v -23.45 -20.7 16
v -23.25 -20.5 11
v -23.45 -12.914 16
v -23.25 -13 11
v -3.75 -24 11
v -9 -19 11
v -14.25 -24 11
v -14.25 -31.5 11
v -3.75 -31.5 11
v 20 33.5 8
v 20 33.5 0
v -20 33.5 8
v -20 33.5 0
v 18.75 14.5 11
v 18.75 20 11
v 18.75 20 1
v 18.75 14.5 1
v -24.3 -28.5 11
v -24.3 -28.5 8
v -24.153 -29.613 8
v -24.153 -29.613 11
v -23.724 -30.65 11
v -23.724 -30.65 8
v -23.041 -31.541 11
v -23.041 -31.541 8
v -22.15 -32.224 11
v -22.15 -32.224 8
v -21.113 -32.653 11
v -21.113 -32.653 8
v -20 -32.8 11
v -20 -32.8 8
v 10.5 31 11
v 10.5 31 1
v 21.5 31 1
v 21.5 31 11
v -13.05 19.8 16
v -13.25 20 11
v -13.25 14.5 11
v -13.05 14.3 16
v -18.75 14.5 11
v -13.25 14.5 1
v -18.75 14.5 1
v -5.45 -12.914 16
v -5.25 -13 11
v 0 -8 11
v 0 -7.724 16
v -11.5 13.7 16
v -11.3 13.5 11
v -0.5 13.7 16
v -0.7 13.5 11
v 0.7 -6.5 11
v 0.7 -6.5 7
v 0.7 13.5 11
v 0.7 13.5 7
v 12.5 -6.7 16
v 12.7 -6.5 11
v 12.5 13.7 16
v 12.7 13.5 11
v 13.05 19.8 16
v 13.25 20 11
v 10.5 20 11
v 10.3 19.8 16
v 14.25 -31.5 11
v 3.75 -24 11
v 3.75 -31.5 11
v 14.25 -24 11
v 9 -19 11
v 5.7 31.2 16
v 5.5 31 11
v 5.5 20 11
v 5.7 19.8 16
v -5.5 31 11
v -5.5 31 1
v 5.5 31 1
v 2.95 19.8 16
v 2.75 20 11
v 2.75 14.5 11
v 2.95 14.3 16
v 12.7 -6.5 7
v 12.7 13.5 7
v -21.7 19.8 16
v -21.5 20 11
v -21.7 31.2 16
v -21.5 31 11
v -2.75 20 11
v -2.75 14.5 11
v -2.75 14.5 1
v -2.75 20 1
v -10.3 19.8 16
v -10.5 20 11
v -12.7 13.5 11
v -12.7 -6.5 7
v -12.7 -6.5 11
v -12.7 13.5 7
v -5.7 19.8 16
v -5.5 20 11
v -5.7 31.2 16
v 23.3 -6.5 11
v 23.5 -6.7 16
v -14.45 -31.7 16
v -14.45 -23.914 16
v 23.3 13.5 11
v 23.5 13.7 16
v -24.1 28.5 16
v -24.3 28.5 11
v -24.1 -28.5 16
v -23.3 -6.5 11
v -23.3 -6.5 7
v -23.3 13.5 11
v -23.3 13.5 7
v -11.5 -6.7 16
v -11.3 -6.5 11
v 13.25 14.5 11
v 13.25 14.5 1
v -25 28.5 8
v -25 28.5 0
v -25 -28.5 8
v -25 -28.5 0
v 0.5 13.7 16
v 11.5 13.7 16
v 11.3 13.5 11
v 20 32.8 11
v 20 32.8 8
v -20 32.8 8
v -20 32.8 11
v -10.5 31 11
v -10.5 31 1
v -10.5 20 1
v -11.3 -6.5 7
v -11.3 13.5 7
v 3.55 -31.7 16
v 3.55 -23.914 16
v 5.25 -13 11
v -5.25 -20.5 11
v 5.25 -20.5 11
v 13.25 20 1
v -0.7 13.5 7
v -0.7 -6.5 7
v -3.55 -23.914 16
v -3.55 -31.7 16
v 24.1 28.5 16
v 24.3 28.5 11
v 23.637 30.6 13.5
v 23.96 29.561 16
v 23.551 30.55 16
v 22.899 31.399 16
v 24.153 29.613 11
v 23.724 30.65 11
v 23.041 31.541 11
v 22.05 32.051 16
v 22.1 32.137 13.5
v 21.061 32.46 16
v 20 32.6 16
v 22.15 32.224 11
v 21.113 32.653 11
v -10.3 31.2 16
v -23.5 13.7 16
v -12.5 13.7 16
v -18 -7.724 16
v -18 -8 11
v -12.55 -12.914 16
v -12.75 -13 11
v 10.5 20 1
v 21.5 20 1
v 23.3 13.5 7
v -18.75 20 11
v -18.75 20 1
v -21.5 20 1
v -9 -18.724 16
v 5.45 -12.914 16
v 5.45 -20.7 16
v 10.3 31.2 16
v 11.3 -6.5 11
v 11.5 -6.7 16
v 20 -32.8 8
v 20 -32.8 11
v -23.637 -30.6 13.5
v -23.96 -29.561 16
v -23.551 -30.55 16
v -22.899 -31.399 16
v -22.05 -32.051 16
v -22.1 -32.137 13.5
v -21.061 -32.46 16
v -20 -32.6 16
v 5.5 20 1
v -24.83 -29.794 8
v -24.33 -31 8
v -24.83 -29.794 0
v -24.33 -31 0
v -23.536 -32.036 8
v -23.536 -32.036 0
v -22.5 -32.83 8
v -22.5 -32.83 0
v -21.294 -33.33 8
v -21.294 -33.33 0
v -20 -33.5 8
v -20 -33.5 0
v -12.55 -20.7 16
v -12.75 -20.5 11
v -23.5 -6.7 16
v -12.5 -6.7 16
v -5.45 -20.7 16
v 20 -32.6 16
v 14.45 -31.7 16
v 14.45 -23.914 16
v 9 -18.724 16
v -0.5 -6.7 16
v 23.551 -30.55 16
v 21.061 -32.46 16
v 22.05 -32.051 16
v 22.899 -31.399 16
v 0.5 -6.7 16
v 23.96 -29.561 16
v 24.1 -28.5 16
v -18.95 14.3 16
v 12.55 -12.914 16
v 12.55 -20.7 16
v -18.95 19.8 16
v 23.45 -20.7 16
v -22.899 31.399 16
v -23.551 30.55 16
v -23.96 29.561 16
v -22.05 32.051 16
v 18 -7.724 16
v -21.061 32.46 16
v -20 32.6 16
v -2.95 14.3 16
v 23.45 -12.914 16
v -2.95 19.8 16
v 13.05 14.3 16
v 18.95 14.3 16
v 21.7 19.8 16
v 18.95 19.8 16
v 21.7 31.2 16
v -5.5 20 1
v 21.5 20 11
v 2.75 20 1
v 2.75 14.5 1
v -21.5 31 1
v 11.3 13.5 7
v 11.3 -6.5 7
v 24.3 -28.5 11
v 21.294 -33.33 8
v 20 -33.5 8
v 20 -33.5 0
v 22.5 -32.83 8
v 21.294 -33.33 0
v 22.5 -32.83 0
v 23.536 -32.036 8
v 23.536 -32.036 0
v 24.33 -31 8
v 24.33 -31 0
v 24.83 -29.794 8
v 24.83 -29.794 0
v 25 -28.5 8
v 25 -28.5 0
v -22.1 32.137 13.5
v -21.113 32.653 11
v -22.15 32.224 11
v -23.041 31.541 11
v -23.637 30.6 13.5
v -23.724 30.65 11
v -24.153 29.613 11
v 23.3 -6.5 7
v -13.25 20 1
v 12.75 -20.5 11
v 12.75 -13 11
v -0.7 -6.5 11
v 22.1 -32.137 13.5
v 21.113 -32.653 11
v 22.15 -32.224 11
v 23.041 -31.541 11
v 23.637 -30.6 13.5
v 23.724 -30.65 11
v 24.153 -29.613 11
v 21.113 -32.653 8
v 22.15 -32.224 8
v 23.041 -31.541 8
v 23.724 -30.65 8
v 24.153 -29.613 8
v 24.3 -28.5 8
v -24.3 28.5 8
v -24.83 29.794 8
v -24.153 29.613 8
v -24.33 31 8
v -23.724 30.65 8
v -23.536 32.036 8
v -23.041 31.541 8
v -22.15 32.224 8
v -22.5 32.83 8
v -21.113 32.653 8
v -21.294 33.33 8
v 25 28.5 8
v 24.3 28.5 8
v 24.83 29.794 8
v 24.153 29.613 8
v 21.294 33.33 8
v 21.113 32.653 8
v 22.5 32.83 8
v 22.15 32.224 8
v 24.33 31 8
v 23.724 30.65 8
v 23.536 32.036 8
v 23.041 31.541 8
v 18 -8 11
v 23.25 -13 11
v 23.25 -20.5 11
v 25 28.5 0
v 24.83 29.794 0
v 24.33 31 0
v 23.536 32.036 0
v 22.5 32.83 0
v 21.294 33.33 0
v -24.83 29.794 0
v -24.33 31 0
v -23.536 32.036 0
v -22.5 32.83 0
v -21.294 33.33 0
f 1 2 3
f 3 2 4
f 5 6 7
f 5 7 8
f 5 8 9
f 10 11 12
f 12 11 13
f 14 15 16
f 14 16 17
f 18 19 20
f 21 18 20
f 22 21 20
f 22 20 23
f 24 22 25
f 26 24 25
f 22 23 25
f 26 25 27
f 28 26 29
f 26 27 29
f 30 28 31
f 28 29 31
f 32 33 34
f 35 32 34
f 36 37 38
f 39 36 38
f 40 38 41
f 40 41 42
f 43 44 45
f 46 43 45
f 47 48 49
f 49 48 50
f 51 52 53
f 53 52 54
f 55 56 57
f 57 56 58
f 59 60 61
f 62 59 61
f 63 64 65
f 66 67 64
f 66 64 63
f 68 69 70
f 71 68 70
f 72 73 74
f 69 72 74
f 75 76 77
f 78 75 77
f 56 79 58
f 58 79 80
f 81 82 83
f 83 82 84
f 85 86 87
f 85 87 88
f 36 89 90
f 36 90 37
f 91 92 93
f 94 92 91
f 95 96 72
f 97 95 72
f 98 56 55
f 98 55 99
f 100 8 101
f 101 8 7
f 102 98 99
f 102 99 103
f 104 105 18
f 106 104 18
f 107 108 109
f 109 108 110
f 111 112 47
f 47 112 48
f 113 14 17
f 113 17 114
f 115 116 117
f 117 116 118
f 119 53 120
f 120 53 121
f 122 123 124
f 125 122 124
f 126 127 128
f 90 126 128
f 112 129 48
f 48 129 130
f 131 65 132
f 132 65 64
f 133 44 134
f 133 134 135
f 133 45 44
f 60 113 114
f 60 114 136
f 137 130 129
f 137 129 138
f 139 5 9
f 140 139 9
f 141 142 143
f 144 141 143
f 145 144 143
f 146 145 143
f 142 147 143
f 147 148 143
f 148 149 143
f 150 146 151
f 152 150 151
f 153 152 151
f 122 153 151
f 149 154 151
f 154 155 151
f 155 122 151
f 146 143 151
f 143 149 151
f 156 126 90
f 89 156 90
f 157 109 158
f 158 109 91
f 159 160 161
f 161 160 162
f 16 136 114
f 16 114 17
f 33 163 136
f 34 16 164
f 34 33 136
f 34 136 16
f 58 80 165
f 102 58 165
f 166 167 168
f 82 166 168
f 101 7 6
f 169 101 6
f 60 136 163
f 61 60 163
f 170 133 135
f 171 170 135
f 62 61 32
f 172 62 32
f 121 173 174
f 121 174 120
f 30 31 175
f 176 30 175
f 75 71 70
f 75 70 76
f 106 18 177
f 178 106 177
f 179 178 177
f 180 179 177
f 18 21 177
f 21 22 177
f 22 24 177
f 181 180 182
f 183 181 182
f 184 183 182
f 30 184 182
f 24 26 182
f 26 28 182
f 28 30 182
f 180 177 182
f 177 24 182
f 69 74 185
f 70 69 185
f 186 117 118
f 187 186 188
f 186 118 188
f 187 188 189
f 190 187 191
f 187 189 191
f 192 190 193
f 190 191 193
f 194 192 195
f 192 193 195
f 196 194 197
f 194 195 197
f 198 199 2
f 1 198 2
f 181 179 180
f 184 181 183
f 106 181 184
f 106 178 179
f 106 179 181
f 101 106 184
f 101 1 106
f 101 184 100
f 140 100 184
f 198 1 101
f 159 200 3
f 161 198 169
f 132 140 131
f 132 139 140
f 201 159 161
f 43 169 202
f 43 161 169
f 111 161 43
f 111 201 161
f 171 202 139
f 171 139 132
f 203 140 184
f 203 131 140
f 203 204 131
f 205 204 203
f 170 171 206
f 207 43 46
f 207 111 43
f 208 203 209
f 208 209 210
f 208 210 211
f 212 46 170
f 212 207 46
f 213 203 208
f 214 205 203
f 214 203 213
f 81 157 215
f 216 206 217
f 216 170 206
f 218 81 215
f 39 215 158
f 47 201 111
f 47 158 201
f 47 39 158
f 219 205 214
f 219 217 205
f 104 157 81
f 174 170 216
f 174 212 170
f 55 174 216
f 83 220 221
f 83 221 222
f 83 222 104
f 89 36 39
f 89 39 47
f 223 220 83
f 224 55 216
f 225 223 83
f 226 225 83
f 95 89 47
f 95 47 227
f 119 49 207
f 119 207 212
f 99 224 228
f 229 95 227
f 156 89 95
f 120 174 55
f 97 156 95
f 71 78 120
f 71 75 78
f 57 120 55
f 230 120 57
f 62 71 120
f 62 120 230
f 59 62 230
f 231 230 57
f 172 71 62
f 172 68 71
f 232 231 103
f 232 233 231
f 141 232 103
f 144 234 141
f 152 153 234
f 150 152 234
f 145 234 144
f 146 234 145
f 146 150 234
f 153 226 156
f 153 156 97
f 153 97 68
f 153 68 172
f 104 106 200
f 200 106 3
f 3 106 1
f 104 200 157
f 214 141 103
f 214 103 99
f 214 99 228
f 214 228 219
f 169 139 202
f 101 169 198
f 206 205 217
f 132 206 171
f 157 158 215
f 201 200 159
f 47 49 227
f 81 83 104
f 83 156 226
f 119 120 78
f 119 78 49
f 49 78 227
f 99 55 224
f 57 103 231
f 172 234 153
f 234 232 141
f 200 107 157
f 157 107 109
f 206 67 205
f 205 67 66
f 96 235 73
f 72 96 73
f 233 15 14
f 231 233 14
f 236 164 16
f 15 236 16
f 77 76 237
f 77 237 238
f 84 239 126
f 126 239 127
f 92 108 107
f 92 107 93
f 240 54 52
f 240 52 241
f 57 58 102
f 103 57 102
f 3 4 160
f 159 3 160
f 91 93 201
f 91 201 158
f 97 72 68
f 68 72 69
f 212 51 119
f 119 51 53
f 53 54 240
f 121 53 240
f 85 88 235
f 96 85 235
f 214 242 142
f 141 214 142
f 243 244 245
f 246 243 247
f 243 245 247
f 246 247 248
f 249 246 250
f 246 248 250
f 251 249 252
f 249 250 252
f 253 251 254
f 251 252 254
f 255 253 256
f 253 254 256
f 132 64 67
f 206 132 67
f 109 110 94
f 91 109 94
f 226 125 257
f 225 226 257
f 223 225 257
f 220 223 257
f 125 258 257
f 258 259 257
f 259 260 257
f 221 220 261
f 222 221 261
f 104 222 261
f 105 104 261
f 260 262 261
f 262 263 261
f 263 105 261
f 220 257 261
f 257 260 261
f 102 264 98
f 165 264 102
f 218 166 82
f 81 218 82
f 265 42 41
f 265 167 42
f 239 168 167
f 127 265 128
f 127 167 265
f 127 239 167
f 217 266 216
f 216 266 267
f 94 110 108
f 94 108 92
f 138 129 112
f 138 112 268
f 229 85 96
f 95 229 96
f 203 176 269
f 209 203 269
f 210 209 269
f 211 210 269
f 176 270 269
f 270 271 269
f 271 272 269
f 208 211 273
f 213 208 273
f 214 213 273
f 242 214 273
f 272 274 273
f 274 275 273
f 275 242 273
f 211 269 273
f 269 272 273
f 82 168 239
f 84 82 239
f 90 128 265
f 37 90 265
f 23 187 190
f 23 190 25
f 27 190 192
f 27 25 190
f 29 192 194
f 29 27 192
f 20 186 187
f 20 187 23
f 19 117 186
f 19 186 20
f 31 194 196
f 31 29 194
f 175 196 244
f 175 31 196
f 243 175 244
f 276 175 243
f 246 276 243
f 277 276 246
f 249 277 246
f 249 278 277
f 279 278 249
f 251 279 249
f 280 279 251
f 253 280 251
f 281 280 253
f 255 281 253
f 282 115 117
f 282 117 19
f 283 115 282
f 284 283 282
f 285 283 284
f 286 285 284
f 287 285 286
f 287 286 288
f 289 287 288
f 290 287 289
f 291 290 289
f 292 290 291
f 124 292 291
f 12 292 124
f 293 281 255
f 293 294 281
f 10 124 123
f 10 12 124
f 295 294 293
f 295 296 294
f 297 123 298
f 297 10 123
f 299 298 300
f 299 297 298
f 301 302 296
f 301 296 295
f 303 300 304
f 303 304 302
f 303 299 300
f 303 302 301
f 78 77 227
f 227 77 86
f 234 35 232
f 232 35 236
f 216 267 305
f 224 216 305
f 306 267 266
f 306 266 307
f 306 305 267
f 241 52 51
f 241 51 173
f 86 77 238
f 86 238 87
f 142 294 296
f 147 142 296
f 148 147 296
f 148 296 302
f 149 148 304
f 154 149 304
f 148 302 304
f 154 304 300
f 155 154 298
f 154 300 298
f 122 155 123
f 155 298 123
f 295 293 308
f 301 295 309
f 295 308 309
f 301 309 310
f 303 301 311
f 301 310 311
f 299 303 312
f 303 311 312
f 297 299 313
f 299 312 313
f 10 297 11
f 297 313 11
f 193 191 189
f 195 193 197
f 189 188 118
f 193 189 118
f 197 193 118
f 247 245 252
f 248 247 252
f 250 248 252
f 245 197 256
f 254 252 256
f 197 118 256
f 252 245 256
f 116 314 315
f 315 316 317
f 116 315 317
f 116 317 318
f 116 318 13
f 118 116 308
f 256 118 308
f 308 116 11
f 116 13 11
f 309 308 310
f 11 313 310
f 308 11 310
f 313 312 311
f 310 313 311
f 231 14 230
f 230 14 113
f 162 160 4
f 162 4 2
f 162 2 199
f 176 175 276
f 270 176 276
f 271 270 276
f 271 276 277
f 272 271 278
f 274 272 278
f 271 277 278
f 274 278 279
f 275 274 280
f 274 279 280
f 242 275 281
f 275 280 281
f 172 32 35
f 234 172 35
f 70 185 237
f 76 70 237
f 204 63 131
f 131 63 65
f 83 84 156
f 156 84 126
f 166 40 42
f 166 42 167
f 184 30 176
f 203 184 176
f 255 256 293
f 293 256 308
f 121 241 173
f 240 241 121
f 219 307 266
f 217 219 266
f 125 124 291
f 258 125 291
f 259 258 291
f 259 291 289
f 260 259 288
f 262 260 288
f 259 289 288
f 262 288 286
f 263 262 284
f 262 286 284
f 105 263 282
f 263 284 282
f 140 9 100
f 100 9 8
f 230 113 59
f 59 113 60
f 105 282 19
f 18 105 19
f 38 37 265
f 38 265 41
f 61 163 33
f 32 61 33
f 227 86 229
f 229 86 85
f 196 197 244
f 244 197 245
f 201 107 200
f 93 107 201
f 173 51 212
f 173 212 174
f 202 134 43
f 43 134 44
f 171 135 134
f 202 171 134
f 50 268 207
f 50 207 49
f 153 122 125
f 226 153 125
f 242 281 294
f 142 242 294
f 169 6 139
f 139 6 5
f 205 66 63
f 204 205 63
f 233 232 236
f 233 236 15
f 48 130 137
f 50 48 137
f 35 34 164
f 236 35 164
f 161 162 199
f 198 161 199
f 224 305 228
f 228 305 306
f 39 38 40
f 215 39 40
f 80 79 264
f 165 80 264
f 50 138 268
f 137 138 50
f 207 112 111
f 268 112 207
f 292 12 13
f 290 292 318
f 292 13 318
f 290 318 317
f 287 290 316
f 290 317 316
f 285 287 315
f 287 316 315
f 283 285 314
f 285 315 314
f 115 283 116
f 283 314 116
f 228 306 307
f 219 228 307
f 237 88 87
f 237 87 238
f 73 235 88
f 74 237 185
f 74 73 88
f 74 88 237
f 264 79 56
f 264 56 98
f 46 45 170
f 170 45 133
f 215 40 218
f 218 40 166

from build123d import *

# Parameters (mm, degrees)
F1_DEPTH = 1
F0_W     = 10.6
F0_H     = 20
F2_DEPTH = 7
F3_DEPTH = 11
F4_DEPTH = 16
F5_DEPTH = 8
F6_SIZE2 = 4.99999
F6_SIZE  = 0.19999


# Not quite as in the source:
# - a fillet or chamfer is up to 0.001 mm smaller than in the source, because OpenCascade refuses the exact size


with BuildPart() as f1:
    # F0 (on Top) → F1 (new body)
    with BuildSketch(Plane.XY):
        Polygon((-18.75, 14.5), (-13.25, 14.5), (-13.25, 20), (-10.5, 20), (-10.5, 31), (-21.5, 31), (-21.5, 20), (-18.75, 20), align=None)
    extrude(amount=F1_DEPTH)



with BuildPart() as f1b:
    # F0 (on Top) → F1, piece 2 (new body)
    with BuildSketch(Plane.XY):
        Polygon((5.5, 31), (-5.5, 31), (-5.5, 20), (-2.75, 20), (-2.75, 14.5), (2.75, 14.5), (2.75, 20), (5.5, 20), align=None)
    extrude(amount=F1_DEPTH)


with BuildPart() as f1c:
    # F0 (on Top) → F1, piece 3 (new body)
    with BuildSketch(Plane.XY):
        Polygon((21.5, 31), (10.5, 31), (10.5, 20), (13.25, 20), (13.25, 14.5), (18.75, 14.5), (18.75, 20), (21.5, 20), align=None)
    extrude(amount=F1_DEPTH)


with BuildPart() as f2:
    # F0 (on Top) → F2 (new body)
    with BuildSketch(Plane.XY):
        with Locations((-18, 3.5)):
            Rectangle(F0_W, F0_H)
    extrude(amount=F2_DEPTH)


with BuildPart() as f2b:
    # F0 (on Top) → F2, piece 2 (new body)
    with BuildSketch(Plane.XY):
        with Locations((-6, 3.5)):
            Rectangle(F0_W, F0_H)
    extrude(amount=F2_DEPTH)


with BuildPart() as f2c:
    # F0 (on Top) → F2, piece 3 (new body)
    with BuildSketch(Plane.XY):
        with Locations((6, 3.5)):
            Rectangle(F0_W, F0_H)
    extrude(amount=F2_DEPTH)


with BuildPart() as f2d:
    # F0 (on Top) → F2, piece 4 (new body)
    with BuildSketch(Plane.XY):
        with Locations((18, 3.5)):
            Rectangle(F0_W, F0_H)
    extrude(amount=F2_DEPTH)


with BuildPart() as f3:
    # F0 (on Top) → F3 (new body)
    with BuildSketch(Plane.XY):
        Polygon((-18, -8), (-23.25, -13), (-23.25, -20.5), (-12.75, -20.5), (-12.75, -13), align=None)
    extrude(amount=F3_DEPTH)


with BuildPart() as f3b:
    # F0 (on Top) → F3, piece 2 (new body)
    with BuildSketch(Plane.XY):
        Polygon((-5.25, -13), (-5.25, -20.5), (5.25, -20.5), (5.25, -13), (0, -8), align=None)
    extrude(amount=F3_DEPTH)


with BuildPart() as f3c:
    # F0 (on Top) → F3, piece 3 (new body)
    with BuildSketch(Plane.XY):
        Polygon((12.75, -13), (12.75, -20.5), (23.25, -20.5), (23.25, -13), (18, -8), align=None)
    extrude(amount=F3_DEPTH)


with BuildPart() as f3d:
    # F0 (on Top) → F3, piece 4 (new body)
    with BuildSketch(Plane.XY):
        Polygon((14.25, -31.5), (14.25, -24), (9, -19), (3.75, -24), (3.75, -31.5), align=None)
    extrude(amount=F3_DEPTH)


with BuildPart() as f3e:
    # F0 (on Top) → F3, piece 5 (new body)
    with BuildSketch(Plane.XY):
        Polygon((-3.75, -31.5), (-3.75, -24), (-9, -19), (-14.25, -24), (-14.25, -31.5), align=None)
    extrude(amount=F3_DEPTH)


with BuildPart() as f1_1:
    add(f1.part)

    add(f1b.part)  # F4 merges F1b

    add(f1c.part)  # F4 merges F1c

    add(f2.part)  # F4 merges F2

    add(f2b.part)  # F4 merges F2b

    add(f2c.part)  # F4 merges F2c

    add(f2d.part)  # F4 merges F2d

    add(f3.part)  # F4 merges F3

    add(f3b.part)  # F4 merges F3b

    add(f3c.part)  # F4 merges F3c

    add(f3d.part)  # F4 merges F3d

    add(f3e.part)  # F4 merges F3e
    # F0 (on Top) → F4 (join)
    with BuildSketch(Plane.XY):
        with BuildLine():
            ThreePointArc((24.3, 28.5), (23.0405591591, 31.5405591591), (20, 32.8))
            Line((20, 32.8), (-20, 32.8))
            ThreePointArc((-20, 32.8), (-23.0405591591, 31.5405591591), (-24.3, 28.5))
            Line((-24.3, 28.5), (-24.3, -28.5))
            ThreePointArc((-24.3, -28.5), (-23.0405591591, -31.5405591591), (-20, -32.8))
            Line((-20, -32.8), (20, -32.8))
            ThreePointArc((20, -32.8), (23.0405591591, -31.5405591591), (24.3, -28.5))
            Line((24.3, -28.5), (24.3, 28.5))
        make_face()
        Polygon((-9, -19), (-3.75, -24), (-3.75, -31.5), (-14.25, -31.5), (-14.25, -24), align=None, mode=Mode.SUBTRACT)
        Polygon((-23.25, -20.5), (-23.25, -13), (-18, -8), (-12.75, -13), (-12.75, -20.5), align=None, mode=Mode.SUBTRACT)
        Polygon((9, -19), (14.25, -24), (14.25, -31.5), (3.75, -31.5), (3.75, -24), align=None, mode=Mode.SUBTRACT)
        Polygon((5.25, -20.5), (-5.25, -20.5), (-5.25, -13), (0, -8), (5.25, -13), align=None, mode=Mode.SUBTRACT)
        Polygon((23.25, -20.5), (12.75, -20.5), (12.75, -13), (18, -8), (23.25, -13), align=None, mode=Mode.SUBTRACT)
        with Locations((-18, 3.5)):
            Rectangle(F0_W, F0_H, mode=Mode.SUBTRACT)
        with Locations((-6, 3.5)):
            Rectangle(F0_W, F0_H, mode=Mode.SUBTRACT)
        Polygon((-13.25, 20), (-13.25, 14.5), (-18.75, 14.5), (-18.75, 20), (-21.5, 20), (-21.5, 31), (-10.5, 31), (-10.5, 20), align=None, mode=Mode.SUBTRACT)
        with Locations((6, 3.5)):
            Rectangle(F0_W, F0_H, mode=Mode.SUBTRACT)
        with Locations((18, 3.5)):
            Rectangle(F0_W, F0_H, mode=Mode.SUBTRACT)
        Polygon((-5.5, 20), (-5.5, 31), (5.5, 31), (5.5, 20), (2.75, 20), (2.75, 14.5), (-2.75, 14.5), (-2.75, 20), align=None, mode=Mode.SUBTRACT)
        Polygon((10.5, 20), (10.5, 31), (21.5, 31), (21.5, 20), (18.75, 20), (18.75, 14.5), (13.25, 14.5), (13.25, 20), align=None, mode=Mode.SUBTRACT)
    extrude(amount=F4_DEPTH)

    # F0 (on Top) → F5 (join)
    with BuildSketch(Plane.XY):
        with BuildLine():
            ThreePointArc((25, 28.5), (23.5355339059, 32.0355339059), (20, 33.5))
            Line((20, 33.5), (-20, 33.5))
            ThreePointArc((-20, 33.5), (-23.5355339059, 32.0355339059), (-25, 28.5))
            Line((-25, 28.5), (-25, -28.5))
            ThreePointArc((-25, -28.5), (-23.5355339059, -32.0355339059), (-20, -33.5))
            Line((-20, -33.5), (20, -33.5))
            ThreePointArc((20, -33.5), (23.5355339059, -32.0355339059), (25, -28.5))
            Line((25, -28.5), (25, 28.5))
        make_face()
        with BuildLine():
            Line((-20, 32.8), (20, 32.8))
            ThreePointArc((20, 32.8), (23.0405591591, 31.5405591591), (24.3, 28.5))
            Line((24.3, 28.5), (24.3, -28.5))
            ThreePointArc((24.3, -28.5), (23.0405591591, -31.5405591591), (20, -32.8))
            Line((20, -32.8), (-20, -32.8))
            ThreePointArc((-20, -32.8), (-23.0405591591, -31.5405591591), (-24.3, -28.5))
            Line((-24.3, -28.5), (-24.3, 28.5))
            ThreePointArc((-24.3, 28.5), (-23.0405591591, 31.5405591591), (-20, 32.8))
        make_face(mode=Mode.SUBTRACT)
    extrude(amount=F5_DEPTH)

    # F6 (size 0.2 and 5 in the source; OpenCascade refuses exactly that, so slightly less here)
    f6_edges = [f1_1.edges().sort_by_distance(p)[0] for p in [
        (23.040559, 31.540559, 16),
        (0, 32.8, 16),
        (-23.040559, 31.540559, 16),
        (-24.3, 0, 16),
        (-23.040559, -31.540559, 16),
        (0, -32.8, 16),
        (23.040559, -31.540559, 16),
        (24.3, 0, 16),
        (-6.375, -21.5, 16),
        (-3.75, -27.75, 16),
        (-9, -31.5, 16),
        (-14.25, -27.75, 16),
        (-11.625, -21.5, 16),
        (-23.25, -16.75, 16),
        (-20.625, -10.5, 16),
        (-15.375, -10.5, 16),
        (-12.75, -16.75, 16),
        (-18, -20.5, 16),
        (11.625, -21.5, 16),
        (14.25, -27.75, 16),
        (9, -31.5, 16),
        (3.75, -27.75, 16),
        (6.375, -21.5, 16),
        (0, -20.5, 16),
        (-5.25, -16.75, 16),
        (-2.625, -10.5, 16),
        (2.625, -10.5, 16),
        (5.25, -16.75, 16),
        (18, -20.5, 16),
        (12.75, -16.75, 16),
        (15.375, -10.5, 16),
        (20.625, -10.5, 16),
        (23.25, -16.75, 16),
        (-23.3, 3.5, 16),
        (-18, 13.5, 16),
        (-12.7, 3.5, 16),
        (-18, -6.5, 16),
        (-6, -6.5, 16),
        (-11.3, 3.5, 16),
        (-6, 13.5, 16),
        (-0.7, 3.5, 16),
        (-13.25, 17.25, 16),
        (-16, 14.5, 16),
        (-18.75, 17.25, 16),
        (-20.125, 20, 16),
        (-21.5, 25.5, 16),
        (-16, 31, 16),
        (-10.5, 25.5, 16),
        (-11.875, 20, 16),
        (6, -6.5, 16),
        (0.7, 3.5, 16),
        (6, 13.5, 16),
        (11.3, 3.5, 16),
        (18, -6.5, 16),
        (12.7, 3.5, 16),
        (18, 13.5, 16),
        (23.3, 3.5, 16),
        (-5.5, 25.5, 16),
        (0, 31, 16),
        (5.5, 25.5, 16),
        (4.125, 20, 16),
        (2.75, 17.25, 16),
        (0, 14.5, 16),
        (-2.75, 17.25, 16),
        (-4.125, 20, 16),
        (10.5, 25.5, 16),
        (16, 31, 16),
        (21.5, 25.5, 16),
        (20.125, 20, 16),
        (18.75, 17.25, 16),
        (16, 14.5, 16),
        (13.25, 17.25, 16),
        (11.875, 20, 16),
    ]]
    f6_side = f1_1.faces().sort_by_distance((0, -2.524734, 16))[0]
    chamfer(f6_edges, length=F6_SIZE, length2=F6_SIZE2, reference=f6_side)


solid = f1_1.part
